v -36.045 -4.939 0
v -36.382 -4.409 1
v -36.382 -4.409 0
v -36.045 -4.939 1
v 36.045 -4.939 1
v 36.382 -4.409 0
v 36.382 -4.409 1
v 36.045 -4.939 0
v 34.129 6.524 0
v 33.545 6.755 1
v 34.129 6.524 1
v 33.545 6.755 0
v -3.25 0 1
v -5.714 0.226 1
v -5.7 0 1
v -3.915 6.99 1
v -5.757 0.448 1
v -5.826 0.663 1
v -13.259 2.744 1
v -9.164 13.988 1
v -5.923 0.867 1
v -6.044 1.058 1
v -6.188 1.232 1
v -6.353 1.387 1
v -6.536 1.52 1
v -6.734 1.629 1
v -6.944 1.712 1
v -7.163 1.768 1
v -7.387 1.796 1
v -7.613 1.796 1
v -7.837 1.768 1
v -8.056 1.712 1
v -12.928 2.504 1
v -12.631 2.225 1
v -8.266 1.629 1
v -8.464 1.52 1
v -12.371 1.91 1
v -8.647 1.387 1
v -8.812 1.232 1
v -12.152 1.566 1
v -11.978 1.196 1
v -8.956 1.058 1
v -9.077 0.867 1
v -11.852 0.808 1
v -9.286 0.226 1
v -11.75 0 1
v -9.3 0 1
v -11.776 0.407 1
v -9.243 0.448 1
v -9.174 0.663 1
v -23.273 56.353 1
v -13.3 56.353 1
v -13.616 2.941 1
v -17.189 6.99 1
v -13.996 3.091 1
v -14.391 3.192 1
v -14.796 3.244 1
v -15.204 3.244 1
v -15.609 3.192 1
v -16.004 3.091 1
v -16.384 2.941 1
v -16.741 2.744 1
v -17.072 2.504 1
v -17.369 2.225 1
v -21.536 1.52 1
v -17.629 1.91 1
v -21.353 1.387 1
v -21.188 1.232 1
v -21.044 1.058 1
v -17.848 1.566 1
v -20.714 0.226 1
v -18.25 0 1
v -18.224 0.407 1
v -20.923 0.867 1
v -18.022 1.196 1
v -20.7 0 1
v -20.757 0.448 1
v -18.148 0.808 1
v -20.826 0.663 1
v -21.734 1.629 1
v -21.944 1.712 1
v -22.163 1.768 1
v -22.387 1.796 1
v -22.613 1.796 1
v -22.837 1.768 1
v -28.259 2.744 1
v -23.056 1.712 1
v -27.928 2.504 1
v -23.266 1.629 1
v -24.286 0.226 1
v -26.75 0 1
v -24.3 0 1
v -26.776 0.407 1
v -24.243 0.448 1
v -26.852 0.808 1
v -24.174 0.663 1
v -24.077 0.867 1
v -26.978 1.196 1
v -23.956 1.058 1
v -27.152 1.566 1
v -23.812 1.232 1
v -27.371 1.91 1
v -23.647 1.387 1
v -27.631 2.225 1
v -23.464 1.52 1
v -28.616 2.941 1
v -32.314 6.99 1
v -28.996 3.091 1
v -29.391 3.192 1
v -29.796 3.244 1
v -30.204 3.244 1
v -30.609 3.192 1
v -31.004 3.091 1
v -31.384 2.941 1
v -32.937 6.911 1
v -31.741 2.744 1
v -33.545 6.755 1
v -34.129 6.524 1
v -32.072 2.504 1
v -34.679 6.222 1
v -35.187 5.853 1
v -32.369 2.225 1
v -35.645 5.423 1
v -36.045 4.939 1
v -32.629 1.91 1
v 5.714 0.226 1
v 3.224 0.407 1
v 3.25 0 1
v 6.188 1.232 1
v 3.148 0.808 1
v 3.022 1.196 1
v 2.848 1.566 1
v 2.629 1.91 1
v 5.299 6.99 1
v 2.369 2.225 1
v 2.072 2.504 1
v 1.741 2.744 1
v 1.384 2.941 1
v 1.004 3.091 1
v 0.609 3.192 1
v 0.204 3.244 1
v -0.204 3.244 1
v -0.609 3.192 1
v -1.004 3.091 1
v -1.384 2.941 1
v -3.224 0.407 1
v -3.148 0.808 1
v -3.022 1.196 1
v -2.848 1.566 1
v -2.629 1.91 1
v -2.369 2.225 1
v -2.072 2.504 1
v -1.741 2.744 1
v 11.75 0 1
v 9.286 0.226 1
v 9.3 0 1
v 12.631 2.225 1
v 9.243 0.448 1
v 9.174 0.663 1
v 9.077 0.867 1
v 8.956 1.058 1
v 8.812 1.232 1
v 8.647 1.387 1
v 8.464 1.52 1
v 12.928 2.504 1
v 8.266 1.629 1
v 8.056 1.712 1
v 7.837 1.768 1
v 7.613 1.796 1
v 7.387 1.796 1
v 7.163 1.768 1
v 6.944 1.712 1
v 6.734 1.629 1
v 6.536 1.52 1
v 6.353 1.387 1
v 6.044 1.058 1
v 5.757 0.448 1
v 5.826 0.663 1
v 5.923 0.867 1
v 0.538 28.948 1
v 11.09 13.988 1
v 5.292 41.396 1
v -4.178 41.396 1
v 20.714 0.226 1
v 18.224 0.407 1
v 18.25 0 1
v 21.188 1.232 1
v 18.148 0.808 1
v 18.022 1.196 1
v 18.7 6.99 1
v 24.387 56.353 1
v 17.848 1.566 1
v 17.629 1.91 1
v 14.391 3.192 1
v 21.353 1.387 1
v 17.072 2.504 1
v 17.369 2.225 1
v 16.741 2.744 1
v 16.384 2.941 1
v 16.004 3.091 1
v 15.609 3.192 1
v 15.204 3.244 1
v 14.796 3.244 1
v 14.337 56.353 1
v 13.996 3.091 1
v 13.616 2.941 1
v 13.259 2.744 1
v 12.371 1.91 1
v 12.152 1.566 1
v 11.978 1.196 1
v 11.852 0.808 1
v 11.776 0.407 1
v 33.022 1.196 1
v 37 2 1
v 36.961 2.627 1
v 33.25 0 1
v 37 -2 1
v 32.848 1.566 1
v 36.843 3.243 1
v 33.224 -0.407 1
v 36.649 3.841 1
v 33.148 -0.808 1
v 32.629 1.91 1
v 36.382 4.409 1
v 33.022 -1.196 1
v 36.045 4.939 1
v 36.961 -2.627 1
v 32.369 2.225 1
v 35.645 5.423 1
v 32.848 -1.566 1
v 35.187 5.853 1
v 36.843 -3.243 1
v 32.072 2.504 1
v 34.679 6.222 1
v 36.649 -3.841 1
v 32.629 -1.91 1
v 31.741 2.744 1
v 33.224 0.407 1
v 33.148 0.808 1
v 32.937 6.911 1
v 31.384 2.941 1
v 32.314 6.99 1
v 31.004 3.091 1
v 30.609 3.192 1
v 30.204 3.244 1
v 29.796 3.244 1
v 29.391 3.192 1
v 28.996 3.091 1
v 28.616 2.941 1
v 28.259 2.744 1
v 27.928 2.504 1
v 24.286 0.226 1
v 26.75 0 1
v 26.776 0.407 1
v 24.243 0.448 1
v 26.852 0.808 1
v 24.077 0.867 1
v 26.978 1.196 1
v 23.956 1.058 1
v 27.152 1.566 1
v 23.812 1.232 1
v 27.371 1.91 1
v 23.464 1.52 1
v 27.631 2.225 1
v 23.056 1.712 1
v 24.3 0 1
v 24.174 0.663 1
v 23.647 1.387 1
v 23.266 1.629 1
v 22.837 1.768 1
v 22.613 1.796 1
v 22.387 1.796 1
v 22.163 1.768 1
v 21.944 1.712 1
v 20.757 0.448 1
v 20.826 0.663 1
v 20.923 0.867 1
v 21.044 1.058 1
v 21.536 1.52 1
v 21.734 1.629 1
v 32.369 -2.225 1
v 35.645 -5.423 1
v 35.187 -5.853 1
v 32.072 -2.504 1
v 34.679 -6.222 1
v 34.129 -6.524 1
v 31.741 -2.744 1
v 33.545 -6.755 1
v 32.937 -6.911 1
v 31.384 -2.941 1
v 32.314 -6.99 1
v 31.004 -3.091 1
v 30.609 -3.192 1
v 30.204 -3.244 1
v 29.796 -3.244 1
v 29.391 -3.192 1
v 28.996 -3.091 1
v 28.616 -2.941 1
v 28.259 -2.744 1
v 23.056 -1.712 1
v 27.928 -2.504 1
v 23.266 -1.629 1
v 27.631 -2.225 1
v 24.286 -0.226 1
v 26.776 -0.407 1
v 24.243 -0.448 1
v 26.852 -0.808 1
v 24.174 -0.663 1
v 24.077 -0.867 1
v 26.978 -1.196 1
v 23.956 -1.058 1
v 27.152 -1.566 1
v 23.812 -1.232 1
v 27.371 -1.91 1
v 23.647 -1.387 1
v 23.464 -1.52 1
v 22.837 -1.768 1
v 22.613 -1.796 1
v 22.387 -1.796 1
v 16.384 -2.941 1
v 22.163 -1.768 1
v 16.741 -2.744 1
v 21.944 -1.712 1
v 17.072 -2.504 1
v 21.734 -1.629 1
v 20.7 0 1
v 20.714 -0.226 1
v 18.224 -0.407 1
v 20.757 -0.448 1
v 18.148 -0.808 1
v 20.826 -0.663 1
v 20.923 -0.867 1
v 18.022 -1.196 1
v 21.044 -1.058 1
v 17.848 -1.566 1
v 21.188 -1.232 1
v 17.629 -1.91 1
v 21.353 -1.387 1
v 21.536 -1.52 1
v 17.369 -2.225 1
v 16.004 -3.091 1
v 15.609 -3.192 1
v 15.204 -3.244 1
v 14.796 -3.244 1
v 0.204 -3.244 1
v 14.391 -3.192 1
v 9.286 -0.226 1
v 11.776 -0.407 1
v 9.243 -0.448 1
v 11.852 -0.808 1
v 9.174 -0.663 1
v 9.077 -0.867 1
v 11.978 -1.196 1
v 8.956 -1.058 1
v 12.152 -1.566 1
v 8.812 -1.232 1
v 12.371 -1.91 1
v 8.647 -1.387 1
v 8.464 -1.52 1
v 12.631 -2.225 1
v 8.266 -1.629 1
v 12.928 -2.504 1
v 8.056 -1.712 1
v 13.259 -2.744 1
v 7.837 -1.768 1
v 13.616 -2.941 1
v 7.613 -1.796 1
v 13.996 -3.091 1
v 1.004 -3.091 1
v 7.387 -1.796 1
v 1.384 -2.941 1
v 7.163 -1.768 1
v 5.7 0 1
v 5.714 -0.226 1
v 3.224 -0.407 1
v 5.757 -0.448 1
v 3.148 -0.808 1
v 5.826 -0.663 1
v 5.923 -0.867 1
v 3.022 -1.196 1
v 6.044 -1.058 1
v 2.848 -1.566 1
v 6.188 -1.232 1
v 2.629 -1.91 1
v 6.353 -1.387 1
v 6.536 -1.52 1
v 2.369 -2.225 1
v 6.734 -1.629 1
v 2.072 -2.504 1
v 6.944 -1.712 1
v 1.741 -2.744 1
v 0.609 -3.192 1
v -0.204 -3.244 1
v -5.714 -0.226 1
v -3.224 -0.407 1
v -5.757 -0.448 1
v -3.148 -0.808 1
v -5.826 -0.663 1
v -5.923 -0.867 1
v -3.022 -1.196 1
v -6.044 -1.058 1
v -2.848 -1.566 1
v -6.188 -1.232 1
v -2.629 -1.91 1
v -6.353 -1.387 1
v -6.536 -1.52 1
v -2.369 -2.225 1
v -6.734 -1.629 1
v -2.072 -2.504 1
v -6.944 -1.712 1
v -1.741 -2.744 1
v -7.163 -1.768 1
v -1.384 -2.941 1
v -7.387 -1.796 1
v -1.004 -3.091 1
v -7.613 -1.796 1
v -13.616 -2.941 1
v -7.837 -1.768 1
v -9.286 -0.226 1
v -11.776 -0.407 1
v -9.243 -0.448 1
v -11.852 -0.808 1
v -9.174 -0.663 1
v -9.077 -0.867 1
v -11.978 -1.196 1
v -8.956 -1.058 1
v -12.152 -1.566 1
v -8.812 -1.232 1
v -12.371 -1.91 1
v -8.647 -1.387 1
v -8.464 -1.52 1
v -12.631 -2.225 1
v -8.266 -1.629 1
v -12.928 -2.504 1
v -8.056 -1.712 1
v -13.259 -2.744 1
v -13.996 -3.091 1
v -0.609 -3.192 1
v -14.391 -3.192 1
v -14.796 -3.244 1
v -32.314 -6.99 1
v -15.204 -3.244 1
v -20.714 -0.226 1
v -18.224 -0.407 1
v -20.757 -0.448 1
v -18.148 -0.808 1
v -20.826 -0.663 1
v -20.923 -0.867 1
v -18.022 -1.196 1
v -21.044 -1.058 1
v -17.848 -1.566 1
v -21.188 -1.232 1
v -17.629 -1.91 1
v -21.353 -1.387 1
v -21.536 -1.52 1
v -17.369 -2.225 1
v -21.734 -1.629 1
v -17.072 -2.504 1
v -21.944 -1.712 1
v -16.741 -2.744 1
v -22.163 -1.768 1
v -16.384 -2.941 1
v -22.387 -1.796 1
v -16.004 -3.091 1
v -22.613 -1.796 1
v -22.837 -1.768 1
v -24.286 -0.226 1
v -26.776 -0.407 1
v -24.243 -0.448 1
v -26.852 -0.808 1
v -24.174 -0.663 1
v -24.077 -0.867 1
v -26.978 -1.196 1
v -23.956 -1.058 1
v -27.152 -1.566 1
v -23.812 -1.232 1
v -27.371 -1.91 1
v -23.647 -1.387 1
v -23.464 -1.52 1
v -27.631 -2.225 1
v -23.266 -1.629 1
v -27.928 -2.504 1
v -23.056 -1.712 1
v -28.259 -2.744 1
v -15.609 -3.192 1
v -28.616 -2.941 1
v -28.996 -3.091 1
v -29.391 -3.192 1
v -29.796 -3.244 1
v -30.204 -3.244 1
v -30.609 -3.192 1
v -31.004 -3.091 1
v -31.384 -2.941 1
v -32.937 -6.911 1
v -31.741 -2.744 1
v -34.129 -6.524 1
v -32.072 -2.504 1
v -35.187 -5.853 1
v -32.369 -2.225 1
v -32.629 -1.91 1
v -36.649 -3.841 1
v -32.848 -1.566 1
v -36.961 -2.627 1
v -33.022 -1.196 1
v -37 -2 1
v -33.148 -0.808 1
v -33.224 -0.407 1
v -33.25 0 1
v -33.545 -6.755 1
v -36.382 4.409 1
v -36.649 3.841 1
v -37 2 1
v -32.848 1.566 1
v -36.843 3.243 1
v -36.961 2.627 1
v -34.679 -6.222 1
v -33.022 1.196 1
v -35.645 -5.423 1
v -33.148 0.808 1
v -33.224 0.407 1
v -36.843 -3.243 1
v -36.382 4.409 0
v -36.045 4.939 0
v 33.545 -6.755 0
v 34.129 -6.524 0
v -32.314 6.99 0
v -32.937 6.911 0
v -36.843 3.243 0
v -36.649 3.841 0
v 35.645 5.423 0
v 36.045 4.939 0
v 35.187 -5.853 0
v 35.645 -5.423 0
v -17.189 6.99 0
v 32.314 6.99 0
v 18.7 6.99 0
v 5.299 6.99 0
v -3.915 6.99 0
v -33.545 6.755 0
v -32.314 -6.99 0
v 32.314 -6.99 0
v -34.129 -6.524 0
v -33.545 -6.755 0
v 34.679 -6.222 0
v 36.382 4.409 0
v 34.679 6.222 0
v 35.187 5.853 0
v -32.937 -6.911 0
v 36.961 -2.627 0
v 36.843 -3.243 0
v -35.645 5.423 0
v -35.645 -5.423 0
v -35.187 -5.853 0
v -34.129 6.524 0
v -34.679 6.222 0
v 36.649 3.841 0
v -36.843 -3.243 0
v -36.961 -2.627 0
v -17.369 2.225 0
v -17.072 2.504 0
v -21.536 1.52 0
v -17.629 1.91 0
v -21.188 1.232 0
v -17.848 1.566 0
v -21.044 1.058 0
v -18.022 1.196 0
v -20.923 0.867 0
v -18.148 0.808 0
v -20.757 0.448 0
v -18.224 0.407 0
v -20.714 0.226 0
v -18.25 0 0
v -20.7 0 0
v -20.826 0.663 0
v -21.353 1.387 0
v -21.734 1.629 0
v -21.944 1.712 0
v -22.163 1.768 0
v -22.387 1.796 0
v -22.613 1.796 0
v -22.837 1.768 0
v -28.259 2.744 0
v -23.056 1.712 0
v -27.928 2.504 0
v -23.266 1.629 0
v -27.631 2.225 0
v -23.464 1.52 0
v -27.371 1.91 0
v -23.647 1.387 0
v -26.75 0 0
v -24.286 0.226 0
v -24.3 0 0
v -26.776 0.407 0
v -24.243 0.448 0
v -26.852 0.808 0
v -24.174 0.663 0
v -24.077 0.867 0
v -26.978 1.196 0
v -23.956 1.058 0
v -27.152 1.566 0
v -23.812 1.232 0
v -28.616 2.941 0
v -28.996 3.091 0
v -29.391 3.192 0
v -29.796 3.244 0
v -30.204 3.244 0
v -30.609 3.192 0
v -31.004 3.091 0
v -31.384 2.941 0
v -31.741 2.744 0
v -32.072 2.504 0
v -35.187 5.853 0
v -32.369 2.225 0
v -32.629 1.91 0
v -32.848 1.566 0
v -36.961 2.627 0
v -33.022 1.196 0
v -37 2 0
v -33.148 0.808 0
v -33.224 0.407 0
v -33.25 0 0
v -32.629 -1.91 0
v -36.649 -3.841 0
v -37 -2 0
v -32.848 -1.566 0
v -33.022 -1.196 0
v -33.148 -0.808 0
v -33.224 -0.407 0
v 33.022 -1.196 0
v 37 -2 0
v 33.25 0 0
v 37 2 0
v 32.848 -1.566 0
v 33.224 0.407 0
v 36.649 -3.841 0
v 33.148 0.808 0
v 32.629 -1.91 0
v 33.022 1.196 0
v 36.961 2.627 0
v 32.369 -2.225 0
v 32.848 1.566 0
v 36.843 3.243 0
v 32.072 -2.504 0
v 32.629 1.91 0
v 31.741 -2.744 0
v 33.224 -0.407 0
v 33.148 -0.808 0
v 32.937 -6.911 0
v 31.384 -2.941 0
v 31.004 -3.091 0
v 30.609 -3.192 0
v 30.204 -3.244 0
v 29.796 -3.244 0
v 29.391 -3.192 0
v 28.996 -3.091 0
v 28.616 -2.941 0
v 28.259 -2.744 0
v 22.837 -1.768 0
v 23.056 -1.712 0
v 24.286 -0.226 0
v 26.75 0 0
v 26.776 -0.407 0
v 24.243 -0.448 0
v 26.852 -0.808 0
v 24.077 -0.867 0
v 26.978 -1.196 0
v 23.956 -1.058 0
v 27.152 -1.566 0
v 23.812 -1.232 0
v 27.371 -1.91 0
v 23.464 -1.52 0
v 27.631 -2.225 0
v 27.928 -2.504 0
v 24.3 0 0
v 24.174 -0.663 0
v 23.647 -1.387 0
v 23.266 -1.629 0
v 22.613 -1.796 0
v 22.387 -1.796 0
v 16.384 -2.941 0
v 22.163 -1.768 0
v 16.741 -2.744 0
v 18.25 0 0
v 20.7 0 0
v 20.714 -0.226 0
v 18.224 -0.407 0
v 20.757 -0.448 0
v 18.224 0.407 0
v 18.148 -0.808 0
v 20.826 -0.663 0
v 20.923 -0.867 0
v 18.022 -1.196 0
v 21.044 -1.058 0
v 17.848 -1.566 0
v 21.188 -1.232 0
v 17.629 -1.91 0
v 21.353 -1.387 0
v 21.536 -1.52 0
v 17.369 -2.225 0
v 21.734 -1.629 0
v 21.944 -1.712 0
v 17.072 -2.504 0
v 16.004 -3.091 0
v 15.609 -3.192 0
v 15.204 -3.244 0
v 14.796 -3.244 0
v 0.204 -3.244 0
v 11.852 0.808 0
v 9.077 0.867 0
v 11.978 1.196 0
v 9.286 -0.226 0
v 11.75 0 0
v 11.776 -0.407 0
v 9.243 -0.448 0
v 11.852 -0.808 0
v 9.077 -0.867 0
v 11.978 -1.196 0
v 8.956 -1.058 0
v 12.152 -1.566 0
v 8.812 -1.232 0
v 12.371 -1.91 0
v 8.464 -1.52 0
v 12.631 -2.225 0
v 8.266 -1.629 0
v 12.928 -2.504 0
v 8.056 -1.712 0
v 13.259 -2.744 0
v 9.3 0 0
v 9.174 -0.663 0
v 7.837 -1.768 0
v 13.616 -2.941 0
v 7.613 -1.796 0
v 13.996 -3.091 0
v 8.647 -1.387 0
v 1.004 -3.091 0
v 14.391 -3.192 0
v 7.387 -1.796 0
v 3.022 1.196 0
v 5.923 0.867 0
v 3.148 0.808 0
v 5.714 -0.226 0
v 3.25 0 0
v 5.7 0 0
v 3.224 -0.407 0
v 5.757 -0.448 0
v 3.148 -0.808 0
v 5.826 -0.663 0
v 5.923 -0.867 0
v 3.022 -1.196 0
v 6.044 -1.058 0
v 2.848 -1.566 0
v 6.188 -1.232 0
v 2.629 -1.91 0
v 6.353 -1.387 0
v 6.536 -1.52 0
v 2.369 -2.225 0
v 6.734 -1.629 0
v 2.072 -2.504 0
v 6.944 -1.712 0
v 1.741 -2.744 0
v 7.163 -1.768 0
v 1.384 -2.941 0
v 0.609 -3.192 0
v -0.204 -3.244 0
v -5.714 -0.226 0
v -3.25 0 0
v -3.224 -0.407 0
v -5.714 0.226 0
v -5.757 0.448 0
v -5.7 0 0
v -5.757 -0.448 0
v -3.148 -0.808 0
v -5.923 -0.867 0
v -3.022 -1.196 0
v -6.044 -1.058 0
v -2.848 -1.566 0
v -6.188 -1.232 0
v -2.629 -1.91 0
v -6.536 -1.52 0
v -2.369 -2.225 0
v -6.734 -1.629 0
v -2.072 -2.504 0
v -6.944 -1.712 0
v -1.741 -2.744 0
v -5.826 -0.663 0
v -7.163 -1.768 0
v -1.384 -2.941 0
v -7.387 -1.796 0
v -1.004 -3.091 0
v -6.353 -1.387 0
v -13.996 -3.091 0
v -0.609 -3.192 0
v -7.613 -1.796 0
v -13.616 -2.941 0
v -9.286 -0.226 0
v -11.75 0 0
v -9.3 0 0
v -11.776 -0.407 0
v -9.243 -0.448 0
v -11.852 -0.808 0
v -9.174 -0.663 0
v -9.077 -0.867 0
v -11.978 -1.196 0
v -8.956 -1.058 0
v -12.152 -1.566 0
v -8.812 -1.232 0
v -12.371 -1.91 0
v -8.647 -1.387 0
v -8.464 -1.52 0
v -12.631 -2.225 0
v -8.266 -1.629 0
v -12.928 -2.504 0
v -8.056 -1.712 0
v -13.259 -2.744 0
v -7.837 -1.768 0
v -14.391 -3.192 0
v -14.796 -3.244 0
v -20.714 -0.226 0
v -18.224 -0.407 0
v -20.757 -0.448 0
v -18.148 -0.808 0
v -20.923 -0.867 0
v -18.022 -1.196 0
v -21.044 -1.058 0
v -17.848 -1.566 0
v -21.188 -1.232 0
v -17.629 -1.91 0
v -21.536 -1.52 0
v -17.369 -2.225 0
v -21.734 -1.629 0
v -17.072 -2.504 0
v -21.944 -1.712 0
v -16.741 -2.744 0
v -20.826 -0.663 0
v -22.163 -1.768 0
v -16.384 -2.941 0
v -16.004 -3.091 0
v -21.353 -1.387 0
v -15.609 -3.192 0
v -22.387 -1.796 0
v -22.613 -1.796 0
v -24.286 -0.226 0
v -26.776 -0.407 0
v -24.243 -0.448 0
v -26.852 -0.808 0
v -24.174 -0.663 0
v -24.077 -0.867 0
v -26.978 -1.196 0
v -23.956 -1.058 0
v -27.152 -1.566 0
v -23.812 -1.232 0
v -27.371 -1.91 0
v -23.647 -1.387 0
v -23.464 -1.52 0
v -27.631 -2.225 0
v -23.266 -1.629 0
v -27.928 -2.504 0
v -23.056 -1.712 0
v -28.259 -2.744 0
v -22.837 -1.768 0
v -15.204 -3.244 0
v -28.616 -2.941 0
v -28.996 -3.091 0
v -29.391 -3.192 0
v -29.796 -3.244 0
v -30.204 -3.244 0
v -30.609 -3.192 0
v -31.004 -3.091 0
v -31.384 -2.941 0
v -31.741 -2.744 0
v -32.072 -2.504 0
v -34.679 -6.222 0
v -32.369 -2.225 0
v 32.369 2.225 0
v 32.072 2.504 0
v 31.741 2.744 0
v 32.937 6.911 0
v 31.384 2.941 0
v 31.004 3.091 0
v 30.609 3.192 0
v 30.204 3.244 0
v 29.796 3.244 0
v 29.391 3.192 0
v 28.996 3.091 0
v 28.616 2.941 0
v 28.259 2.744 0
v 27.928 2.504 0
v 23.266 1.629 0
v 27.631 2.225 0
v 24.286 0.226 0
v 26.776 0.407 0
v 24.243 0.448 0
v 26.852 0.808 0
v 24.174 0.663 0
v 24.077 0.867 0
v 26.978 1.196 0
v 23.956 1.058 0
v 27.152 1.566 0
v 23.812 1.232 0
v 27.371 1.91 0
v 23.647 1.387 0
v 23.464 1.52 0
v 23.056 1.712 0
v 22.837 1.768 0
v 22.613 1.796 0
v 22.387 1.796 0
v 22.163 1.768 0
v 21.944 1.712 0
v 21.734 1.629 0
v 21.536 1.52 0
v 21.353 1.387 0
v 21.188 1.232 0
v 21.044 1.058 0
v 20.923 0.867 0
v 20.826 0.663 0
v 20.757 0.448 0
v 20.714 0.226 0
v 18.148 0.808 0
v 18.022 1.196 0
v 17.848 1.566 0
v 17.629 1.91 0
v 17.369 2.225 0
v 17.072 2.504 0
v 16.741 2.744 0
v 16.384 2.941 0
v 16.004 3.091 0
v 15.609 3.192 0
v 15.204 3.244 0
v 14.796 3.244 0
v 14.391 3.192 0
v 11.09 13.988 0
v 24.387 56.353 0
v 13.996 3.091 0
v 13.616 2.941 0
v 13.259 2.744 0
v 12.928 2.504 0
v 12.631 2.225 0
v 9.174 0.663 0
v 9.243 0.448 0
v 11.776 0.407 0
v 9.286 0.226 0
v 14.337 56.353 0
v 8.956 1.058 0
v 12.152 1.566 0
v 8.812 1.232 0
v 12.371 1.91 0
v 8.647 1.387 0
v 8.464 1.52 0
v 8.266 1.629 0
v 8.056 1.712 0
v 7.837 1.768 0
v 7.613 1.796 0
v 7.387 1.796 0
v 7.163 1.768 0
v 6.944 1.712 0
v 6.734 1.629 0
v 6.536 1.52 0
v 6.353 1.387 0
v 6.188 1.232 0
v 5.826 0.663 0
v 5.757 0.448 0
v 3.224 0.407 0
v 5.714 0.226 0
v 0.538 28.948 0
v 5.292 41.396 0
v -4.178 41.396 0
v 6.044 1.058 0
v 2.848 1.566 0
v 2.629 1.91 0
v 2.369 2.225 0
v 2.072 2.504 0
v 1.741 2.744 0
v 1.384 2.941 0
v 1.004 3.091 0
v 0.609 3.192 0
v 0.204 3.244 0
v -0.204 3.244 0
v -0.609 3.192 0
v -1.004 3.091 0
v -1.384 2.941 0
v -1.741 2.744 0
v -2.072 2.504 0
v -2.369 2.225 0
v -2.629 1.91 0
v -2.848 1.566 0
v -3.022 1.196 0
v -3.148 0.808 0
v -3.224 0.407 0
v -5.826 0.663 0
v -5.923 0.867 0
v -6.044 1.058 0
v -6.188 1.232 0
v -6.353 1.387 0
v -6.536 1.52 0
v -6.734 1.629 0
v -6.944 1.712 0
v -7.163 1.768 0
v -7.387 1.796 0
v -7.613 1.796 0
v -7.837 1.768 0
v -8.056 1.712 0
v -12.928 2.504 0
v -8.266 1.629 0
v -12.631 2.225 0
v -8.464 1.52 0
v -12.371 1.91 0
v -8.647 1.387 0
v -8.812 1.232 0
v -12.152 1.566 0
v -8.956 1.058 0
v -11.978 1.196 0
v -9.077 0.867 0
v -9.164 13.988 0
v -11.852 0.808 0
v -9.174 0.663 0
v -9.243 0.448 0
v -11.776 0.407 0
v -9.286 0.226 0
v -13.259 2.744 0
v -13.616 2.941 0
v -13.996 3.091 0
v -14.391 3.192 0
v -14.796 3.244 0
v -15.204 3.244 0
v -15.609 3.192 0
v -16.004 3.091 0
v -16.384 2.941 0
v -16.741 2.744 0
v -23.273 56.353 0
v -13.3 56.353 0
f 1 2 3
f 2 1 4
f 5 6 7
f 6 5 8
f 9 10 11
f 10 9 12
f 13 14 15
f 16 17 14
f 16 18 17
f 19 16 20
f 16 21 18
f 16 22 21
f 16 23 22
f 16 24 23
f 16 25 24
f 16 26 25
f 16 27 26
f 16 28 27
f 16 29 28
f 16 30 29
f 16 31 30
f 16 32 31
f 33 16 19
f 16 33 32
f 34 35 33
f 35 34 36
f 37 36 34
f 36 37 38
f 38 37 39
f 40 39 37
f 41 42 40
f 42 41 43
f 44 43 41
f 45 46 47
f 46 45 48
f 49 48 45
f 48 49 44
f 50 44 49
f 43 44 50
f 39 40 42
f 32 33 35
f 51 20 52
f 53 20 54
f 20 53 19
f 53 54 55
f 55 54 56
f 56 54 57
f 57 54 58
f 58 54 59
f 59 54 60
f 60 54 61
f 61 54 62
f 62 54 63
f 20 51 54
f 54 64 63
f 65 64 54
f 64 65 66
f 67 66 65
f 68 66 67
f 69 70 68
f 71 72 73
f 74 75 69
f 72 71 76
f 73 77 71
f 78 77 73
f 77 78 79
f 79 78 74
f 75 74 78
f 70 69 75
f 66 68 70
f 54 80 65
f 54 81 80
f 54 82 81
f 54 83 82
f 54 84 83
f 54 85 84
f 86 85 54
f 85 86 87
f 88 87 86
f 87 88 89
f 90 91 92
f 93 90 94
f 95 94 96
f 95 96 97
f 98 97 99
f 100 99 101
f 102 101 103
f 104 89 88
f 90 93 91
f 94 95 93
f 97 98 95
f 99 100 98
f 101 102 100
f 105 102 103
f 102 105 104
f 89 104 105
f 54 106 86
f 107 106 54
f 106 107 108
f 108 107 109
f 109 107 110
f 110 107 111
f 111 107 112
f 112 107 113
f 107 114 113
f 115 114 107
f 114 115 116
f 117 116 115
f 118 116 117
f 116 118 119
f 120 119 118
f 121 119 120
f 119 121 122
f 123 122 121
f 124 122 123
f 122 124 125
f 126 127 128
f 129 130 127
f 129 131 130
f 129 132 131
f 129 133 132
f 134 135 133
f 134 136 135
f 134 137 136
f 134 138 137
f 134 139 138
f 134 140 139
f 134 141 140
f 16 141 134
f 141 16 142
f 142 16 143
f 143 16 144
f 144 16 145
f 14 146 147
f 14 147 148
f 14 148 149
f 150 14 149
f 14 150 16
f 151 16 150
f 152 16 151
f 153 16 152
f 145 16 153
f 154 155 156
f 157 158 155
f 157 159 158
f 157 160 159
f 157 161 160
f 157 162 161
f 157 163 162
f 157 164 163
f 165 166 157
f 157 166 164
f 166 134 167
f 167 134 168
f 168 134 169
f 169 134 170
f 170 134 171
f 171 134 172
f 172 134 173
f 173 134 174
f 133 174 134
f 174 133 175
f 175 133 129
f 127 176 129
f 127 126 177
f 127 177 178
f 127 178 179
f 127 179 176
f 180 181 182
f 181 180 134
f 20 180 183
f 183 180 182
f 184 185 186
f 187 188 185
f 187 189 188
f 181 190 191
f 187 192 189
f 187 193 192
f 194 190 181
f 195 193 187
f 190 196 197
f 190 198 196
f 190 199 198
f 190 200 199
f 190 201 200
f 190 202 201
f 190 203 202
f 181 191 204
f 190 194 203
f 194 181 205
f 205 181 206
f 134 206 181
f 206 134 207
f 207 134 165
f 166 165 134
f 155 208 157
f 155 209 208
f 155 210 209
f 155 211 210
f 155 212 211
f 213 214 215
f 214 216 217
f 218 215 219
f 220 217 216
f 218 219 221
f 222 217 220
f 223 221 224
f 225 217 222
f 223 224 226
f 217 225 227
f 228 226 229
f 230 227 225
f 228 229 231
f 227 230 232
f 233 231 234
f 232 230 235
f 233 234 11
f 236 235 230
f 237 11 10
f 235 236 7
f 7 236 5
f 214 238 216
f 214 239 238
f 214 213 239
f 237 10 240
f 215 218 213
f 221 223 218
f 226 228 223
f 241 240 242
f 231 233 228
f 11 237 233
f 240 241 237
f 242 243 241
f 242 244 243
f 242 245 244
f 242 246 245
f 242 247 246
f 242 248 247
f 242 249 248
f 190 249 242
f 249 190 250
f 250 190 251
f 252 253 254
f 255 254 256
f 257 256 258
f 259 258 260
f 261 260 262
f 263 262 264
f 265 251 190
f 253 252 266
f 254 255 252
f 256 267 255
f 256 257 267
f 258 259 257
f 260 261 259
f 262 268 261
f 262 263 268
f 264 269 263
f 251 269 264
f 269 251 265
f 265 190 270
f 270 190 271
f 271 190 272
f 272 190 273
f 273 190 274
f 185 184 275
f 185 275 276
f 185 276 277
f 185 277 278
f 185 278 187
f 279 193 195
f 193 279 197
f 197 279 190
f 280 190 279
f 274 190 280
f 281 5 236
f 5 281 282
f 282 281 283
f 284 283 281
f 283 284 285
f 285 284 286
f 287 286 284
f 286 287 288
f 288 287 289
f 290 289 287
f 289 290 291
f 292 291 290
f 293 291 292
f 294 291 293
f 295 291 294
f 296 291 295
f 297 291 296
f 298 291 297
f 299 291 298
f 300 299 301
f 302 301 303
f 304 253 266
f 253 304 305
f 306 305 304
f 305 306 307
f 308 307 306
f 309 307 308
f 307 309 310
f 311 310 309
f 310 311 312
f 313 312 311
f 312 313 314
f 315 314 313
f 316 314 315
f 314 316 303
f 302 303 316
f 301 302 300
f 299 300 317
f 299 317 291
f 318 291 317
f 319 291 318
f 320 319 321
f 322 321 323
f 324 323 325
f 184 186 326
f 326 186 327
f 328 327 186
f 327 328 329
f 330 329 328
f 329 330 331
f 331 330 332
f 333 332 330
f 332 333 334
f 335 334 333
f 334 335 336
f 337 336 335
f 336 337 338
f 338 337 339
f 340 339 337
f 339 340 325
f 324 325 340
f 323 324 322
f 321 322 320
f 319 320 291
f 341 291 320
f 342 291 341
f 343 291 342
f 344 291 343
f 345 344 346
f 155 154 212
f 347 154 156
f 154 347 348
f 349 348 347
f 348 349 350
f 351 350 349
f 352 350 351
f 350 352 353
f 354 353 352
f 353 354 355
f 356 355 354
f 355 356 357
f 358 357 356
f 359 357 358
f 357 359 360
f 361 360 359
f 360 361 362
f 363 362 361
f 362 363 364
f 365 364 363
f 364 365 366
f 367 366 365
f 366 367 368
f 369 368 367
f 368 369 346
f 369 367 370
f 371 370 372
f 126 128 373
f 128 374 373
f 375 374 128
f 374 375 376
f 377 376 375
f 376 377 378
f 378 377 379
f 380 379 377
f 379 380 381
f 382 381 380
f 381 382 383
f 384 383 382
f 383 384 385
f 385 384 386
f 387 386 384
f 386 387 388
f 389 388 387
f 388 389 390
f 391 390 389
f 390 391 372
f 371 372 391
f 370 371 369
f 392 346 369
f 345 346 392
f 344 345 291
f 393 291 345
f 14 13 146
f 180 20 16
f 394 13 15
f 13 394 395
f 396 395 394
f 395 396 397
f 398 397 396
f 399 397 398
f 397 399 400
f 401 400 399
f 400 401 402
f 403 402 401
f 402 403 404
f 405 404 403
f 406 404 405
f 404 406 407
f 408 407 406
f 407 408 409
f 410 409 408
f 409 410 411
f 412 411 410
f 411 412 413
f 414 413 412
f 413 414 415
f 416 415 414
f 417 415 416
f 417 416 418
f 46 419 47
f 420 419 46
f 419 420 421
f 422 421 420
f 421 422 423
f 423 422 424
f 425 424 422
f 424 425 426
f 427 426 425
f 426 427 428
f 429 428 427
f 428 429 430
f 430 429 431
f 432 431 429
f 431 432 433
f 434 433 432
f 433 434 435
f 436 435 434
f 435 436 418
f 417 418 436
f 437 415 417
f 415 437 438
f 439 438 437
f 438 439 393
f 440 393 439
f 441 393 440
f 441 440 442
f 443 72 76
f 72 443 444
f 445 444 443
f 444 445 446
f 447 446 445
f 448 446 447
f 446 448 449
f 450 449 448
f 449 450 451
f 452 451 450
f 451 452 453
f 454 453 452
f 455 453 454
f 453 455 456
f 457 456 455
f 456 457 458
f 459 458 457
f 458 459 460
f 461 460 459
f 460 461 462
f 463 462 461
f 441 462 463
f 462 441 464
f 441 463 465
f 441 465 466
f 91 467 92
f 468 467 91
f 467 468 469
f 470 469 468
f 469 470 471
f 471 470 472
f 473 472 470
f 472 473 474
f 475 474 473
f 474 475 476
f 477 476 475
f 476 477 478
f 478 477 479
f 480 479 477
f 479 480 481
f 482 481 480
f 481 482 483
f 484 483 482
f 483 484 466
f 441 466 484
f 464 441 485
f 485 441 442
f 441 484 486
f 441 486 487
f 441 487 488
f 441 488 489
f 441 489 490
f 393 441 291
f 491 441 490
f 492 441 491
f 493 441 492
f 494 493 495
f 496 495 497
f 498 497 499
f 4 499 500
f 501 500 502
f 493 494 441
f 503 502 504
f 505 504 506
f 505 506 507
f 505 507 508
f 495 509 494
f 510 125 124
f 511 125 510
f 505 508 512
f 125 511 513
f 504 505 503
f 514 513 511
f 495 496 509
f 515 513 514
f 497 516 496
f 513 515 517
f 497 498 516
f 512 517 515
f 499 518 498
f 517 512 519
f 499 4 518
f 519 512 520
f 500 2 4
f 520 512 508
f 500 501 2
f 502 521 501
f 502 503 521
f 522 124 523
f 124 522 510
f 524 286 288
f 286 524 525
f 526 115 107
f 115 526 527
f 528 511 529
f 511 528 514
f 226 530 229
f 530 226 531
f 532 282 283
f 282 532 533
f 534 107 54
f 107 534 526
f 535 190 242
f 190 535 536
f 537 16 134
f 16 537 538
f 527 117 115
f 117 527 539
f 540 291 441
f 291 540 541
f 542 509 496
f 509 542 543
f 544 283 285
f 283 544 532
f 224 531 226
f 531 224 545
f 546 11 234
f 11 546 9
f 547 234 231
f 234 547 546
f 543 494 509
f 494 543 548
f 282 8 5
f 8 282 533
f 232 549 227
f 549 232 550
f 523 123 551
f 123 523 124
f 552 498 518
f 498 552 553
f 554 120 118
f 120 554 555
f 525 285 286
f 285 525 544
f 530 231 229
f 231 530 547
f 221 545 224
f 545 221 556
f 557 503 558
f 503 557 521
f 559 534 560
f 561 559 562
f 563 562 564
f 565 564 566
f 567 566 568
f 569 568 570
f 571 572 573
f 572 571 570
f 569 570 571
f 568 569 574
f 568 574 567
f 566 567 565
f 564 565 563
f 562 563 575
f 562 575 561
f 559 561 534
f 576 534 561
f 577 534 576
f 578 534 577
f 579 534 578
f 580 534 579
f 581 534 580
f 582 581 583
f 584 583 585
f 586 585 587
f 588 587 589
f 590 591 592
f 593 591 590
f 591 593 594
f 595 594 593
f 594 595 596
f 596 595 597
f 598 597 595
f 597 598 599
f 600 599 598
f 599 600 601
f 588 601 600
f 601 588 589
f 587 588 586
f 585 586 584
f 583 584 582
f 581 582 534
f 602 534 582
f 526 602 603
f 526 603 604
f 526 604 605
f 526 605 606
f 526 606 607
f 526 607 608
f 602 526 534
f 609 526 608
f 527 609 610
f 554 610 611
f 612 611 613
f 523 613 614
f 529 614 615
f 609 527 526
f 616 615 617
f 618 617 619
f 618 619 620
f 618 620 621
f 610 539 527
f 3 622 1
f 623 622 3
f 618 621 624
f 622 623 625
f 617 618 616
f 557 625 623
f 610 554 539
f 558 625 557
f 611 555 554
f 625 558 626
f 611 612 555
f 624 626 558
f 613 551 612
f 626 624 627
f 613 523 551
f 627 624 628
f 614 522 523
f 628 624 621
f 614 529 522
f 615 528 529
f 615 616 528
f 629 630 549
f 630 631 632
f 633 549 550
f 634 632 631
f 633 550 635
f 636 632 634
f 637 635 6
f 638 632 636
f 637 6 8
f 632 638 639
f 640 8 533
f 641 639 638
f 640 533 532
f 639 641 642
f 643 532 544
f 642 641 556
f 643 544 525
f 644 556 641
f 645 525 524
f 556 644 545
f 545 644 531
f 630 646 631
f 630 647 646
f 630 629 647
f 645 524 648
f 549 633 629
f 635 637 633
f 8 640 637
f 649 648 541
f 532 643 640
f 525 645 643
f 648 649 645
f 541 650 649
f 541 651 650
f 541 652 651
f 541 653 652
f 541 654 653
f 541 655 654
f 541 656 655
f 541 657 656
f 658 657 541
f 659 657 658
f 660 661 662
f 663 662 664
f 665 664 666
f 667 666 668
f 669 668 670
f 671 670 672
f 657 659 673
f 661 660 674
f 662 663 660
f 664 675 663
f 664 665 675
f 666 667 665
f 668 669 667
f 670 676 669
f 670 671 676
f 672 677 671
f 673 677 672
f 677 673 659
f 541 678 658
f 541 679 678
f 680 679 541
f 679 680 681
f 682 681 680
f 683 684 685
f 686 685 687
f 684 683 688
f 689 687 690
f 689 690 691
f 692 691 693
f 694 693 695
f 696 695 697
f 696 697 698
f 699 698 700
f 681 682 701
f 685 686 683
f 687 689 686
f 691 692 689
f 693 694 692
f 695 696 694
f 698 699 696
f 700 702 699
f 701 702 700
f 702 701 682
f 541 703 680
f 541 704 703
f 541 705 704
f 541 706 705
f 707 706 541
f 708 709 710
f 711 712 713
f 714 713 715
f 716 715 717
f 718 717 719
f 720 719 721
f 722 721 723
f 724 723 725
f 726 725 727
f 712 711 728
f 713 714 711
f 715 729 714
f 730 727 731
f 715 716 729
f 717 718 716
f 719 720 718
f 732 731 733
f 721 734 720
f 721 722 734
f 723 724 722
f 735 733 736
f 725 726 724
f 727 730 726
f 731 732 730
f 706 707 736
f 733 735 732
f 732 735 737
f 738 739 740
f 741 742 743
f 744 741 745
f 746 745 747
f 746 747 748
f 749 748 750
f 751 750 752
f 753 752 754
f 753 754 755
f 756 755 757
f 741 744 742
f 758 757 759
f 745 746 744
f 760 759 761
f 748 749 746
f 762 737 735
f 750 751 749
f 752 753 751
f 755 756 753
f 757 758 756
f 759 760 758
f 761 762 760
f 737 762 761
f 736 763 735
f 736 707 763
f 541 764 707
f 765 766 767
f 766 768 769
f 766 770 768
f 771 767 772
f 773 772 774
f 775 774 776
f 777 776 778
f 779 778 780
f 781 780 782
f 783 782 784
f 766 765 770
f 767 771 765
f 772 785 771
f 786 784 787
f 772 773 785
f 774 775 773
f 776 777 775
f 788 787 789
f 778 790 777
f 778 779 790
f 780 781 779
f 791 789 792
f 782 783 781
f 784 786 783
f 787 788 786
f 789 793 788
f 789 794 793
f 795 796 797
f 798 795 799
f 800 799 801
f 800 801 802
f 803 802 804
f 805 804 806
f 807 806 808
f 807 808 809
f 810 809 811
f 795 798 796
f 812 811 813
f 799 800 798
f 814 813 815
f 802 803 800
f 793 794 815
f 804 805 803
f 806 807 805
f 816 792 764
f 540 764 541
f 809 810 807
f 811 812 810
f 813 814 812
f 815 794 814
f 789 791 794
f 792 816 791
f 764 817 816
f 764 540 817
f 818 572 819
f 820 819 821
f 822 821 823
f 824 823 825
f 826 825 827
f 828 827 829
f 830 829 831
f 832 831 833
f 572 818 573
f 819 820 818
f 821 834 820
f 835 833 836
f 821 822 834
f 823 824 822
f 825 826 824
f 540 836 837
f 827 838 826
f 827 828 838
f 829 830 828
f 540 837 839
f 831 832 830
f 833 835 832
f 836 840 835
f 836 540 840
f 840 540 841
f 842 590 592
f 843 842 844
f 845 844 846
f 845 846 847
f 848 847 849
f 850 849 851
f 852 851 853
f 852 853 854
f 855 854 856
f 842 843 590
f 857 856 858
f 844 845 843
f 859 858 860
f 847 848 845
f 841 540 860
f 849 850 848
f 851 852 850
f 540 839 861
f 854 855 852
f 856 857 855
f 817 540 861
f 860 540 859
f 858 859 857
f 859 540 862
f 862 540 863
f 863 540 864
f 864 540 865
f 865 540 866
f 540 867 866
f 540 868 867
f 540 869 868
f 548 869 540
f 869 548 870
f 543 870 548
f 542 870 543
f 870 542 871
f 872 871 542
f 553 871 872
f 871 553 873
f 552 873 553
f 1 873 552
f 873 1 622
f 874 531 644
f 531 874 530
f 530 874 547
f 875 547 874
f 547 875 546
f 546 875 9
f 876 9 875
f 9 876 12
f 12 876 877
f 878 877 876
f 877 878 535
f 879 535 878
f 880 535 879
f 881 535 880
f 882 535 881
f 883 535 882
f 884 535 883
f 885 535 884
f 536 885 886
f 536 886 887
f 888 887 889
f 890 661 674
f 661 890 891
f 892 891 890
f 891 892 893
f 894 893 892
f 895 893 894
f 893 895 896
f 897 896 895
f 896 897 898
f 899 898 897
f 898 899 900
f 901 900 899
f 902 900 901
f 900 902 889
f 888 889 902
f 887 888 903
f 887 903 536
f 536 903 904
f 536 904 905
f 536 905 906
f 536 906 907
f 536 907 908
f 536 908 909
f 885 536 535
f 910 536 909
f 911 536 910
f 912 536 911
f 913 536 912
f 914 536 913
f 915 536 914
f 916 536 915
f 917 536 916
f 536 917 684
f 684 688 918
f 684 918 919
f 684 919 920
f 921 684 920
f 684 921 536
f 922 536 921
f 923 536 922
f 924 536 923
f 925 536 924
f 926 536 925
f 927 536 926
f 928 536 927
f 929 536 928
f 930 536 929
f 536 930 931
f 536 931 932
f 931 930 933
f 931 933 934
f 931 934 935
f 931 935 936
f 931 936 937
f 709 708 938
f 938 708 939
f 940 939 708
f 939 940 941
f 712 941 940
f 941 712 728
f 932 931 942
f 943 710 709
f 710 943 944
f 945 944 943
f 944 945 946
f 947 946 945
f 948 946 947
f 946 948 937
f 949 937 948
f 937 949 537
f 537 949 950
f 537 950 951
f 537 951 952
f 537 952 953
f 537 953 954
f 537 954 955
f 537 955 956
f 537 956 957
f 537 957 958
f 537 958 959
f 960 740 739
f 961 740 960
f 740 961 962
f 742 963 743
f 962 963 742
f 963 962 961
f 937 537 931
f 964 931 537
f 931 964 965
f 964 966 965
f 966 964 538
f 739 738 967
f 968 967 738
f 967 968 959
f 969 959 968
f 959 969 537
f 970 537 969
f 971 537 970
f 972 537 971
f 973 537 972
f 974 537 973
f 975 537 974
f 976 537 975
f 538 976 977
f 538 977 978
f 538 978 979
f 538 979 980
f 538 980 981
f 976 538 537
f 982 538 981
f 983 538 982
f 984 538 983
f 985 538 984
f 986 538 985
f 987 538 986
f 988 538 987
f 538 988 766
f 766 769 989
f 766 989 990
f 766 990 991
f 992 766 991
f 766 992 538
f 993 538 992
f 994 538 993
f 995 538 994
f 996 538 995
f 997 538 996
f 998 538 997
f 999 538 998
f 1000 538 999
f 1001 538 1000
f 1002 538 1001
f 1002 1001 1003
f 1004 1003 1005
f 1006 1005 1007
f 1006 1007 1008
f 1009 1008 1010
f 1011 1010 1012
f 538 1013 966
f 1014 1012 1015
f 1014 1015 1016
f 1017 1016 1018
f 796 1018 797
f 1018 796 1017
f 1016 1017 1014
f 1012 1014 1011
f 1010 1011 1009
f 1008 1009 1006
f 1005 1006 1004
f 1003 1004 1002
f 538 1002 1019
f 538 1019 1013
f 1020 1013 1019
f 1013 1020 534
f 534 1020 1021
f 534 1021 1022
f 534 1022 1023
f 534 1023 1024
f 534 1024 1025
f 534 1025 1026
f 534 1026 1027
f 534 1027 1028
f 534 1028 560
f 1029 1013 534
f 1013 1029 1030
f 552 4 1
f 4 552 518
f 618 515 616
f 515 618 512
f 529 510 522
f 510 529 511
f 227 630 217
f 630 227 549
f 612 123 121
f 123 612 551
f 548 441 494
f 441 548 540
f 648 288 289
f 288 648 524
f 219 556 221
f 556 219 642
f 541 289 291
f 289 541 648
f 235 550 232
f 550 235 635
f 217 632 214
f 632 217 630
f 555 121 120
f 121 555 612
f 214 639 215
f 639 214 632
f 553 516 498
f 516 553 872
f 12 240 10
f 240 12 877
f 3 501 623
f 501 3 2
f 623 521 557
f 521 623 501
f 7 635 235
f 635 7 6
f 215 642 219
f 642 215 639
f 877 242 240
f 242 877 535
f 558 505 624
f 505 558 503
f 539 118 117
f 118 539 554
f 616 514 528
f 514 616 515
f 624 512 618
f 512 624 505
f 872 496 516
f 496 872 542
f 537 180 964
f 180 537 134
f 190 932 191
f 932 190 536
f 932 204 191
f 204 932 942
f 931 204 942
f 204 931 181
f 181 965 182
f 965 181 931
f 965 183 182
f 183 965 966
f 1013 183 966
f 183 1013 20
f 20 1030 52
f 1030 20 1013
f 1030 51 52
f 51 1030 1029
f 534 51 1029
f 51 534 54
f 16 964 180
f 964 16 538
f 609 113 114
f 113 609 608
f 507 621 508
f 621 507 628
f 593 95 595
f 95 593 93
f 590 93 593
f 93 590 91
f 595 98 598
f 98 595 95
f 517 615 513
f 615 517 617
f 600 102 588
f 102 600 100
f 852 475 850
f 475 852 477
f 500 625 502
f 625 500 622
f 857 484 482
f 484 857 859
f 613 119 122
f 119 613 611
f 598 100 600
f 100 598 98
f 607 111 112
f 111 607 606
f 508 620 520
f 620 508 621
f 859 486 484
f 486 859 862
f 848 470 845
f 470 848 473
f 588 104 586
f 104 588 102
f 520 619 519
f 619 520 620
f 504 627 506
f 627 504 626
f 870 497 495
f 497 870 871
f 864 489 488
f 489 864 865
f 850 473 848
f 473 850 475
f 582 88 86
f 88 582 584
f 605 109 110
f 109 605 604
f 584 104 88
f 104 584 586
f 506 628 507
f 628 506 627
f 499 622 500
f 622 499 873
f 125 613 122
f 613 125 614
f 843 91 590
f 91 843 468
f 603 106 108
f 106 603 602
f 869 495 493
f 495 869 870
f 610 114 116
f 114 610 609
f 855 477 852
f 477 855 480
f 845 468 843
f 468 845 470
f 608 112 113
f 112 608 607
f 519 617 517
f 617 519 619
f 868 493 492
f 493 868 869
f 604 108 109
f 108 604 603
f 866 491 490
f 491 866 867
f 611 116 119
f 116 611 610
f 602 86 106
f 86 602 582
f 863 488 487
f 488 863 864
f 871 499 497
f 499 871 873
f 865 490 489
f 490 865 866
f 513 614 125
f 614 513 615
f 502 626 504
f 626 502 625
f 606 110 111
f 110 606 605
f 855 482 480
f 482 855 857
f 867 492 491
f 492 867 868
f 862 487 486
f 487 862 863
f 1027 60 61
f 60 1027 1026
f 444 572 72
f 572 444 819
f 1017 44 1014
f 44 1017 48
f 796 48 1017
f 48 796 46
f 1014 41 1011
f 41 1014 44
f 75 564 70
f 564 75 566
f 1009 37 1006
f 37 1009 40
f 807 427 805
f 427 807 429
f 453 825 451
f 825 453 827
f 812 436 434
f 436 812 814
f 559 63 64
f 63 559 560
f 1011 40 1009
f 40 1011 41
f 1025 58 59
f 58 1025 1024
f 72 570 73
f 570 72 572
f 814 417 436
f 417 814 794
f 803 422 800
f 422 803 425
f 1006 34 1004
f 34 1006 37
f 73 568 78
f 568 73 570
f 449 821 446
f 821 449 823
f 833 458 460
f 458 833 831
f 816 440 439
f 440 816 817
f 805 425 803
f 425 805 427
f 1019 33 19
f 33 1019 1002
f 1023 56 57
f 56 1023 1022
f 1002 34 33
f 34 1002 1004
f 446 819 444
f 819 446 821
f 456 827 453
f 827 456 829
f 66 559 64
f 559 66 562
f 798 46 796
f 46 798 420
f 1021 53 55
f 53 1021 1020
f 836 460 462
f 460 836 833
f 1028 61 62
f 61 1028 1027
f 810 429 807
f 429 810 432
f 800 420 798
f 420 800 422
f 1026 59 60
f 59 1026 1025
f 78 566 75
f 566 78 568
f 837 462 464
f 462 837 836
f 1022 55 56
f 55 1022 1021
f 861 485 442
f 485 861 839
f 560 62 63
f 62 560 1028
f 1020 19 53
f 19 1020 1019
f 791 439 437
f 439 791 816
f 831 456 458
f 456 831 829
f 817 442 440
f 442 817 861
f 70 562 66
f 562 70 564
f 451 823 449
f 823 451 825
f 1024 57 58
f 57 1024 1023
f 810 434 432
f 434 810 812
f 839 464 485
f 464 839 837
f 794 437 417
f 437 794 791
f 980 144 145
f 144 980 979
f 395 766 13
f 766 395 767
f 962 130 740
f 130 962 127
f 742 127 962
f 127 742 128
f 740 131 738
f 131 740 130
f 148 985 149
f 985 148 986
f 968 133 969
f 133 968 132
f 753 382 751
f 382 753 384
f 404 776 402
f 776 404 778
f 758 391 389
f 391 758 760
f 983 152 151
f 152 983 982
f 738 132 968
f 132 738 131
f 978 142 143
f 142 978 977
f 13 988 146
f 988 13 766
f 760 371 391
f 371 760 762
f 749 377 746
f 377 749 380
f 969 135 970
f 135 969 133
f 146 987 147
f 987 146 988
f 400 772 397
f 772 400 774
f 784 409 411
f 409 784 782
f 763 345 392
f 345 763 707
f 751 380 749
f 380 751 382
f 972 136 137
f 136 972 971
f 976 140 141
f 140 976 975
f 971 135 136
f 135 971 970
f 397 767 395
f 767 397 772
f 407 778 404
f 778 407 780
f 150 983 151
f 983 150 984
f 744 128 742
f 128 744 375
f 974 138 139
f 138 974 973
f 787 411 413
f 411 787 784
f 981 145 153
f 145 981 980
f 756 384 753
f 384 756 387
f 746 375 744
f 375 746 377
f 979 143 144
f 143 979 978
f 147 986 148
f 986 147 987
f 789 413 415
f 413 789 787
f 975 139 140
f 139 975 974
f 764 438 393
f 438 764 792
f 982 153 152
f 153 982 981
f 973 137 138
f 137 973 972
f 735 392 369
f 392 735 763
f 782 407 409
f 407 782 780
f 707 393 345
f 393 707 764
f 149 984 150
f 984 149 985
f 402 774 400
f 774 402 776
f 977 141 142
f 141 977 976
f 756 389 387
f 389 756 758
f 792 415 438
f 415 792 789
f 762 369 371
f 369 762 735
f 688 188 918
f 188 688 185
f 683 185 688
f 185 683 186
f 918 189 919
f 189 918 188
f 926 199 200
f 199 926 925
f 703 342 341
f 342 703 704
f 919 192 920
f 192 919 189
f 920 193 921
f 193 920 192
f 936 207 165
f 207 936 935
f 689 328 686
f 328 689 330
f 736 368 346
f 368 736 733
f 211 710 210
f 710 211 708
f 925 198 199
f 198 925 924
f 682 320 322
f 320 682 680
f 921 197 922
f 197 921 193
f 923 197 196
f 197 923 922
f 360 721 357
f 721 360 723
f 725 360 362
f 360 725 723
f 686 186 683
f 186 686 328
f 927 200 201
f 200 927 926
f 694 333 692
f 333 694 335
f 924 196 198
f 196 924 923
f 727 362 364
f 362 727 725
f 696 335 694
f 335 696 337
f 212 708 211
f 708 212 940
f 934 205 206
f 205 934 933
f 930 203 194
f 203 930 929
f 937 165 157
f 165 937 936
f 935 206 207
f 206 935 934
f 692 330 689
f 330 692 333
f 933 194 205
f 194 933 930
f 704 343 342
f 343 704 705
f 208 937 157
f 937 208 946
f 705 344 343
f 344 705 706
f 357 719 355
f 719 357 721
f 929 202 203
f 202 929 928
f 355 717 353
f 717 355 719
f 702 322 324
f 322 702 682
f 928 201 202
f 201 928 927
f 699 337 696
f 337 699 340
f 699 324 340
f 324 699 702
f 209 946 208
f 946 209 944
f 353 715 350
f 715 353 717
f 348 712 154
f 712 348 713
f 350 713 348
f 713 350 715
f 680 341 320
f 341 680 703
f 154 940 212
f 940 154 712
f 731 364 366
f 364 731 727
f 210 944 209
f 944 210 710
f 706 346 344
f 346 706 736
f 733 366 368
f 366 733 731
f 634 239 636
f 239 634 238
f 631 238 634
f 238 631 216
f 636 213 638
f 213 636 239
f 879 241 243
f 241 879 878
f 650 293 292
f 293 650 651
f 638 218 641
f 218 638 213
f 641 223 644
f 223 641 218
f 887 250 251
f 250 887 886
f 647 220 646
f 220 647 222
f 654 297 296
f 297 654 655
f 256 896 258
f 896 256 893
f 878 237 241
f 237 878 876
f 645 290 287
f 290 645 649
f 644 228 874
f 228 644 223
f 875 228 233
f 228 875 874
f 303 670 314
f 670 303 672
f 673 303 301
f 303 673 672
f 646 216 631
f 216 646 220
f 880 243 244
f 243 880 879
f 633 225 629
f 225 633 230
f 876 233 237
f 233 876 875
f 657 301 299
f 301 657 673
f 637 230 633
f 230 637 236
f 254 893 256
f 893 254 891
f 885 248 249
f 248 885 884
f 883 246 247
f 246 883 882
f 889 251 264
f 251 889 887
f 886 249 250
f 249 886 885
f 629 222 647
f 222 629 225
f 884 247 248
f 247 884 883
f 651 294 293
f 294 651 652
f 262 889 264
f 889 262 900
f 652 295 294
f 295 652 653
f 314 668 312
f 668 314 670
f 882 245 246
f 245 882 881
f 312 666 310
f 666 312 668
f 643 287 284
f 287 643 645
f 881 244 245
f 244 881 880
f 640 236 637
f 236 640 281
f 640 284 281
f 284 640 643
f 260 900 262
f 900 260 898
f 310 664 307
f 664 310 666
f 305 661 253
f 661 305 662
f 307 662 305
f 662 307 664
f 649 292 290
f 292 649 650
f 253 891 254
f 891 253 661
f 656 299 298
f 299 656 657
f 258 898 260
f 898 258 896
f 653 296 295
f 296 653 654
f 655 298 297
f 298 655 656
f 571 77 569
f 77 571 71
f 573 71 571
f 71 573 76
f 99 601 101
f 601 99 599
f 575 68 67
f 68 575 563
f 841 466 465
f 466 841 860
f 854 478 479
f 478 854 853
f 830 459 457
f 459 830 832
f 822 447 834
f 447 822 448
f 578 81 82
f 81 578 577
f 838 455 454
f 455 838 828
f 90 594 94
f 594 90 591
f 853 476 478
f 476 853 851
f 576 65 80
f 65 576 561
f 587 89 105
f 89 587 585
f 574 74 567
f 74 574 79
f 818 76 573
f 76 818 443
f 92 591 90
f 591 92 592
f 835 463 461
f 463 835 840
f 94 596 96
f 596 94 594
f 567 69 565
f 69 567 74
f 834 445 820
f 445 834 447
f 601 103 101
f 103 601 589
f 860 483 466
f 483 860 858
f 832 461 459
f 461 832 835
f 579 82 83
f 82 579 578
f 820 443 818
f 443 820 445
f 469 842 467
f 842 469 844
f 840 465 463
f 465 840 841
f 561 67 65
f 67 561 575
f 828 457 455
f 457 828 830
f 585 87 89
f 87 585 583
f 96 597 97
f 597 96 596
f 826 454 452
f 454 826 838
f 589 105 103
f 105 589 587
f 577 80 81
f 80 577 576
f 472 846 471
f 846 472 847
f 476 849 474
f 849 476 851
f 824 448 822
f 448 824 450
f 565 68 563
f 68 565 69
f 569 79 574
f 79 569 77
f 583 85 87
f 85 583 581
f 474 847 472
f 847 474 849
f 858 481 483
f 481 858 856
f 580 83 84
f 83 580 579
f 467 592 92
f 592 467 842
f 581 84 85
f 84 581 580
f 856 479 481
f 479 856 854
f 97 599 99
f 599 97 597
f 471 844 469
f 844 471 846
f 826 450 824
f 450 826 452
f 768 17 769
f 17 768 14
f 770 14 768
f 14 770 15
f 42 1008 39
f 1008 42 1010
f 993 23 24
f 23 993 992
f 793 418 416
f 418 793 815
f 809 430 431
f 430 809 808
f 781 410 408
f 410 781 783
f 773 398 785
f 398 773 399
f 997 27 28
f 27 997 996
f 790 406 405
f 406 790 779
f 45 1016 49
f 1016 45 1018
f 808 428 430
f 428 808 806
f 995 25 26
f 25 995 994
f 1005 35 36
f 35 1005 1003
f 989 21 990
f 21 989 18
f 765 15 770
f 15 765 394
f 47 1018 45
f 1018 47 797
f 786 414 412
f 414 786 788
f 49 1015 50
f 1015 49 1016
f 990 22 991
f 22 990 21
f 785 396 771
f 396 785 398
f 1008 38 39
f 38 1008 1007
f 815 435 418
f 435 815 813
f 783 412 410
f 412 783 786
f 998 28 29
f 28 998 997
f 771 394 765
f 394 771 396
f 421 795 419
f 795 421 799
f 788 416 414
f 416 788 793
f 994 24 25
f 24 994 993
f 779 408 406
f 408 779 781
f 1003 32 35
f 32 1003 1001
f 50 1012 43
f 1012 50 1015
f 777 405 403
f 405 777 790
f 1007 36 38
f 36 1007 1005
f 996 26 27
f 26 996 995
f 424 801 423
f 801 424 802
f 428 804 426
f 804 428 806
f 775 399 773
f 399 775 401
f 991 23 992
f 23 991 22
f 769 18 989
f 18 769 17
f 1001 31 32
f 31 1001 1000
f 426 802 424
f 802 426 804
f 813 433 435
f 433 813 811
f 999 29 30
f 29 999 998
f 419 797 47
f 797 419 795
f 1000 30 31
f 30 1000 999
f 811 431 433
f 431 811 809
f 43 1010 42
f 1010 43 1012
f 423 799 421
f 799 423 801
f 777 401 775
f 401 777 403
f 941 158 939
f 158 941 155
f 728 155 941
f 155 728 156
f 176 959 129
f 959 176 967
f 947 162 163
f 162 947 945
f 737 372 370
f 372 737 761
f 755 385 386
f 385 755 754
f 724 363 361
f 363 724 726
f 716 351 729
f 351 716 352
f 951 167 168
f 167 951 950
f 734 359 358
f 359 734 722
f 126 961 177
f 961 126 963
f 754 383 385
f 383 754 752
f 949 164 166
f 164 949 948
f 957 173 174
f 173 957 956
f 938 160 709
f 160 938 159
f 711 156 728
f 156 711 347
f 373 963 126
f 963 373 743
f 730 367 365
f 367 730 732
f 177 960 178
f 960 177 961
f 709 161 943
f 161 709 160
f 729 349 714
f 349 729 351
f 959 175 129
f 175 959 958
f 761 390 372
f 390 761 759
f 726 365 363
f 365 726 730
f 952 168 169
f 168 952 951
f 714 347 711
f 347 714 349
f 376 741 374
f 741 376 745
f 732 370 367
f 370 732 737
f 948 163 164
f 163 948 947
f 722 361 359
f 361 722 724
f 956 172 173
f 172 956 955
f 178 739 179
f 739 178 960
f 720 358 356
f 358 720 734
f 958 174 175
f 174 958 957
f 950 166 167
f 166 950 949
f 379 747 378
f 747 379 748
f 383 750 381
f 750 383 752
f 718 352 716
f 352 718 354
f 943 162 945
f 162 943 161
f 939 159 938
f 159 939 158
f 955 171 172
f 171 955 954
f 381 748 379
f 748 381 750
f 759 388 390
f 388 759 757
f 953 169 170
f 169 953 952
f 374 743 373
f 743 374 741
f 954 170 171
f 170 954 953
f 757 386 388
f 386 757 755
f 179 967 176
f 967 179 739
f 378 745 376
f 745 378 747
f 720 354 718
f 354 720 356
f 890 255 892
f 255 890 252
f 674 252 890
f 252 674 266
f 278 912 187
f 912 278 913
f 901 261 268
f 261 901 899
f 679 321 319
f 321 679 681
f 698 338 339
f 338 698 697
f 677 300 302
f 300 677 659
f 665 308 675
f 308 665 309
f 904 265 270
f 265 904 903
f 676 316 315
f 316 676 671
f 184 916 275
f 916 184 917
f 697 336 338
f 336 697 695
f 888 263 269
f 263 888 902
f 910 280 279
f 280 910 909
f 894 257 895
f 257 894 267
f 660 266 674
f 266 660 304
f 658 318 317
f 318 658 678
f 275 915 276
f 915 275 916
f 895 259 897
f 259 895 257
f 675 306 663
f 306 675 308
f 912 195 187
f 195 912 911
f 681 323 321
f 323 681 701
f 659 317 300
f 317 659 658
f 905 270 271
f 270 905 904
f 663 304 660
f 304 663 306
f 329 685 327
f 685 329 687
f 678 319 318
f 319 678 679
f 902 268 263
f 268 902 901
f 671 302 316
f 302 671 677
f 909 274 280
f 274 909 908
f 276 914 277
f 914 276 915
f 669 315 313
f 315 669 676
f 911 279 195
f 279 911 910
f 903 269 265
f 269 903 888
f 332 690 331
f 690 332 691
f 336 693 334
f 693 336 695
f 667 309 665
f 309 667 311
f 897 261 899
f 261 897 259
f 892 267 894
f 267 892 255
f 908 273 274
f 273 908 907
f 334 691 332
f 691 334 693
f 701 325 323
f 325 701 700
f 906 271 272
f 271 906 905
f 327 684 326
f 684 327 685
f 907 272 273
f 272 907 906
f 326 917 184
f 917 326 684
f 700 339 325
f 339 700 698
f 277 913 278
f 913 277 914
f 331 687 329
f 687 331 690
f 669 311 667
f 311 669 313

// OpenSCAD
$fn = 50;


difference() {
	union() {
		hull() {
			translate(v = [-32.0000000000, 2.0000000000, 0]) {
				cylinder(h = 1, r = 5);
			}
			translate(v = [32.0000000000, 2.0000000000, 0]) {
				cylinder(h = 1, r = 5);
			}
			translate(v = [-32.0000000000, -2.0000000000, 0]) {
				cylinder(h = 1, r = 5);
			}
			translate(v = [32.0000000000, -2.0000000000, 0]) {
				cylinder(h = 1, r = 5);
			}
		}
		translate(v = [0, 55, 0]) {
			linear_extrude(height = 1) {
				text(font = "DejaVu Sans Mono:style=Bold", halign = "center", size = 57.0000000000, text = "W", valign = "top");
			}
		}
	}
	union() {
		translate(v = [-30.0000000000, 0.0000000000, 0]) {
			translate(v = [0, 0, -100]) {
				cylinder(h = 200, r = 3.2500000000);
			}
		}
		translate(v = [-15.0000000000, 0.0000000000, 0]) {
			translate(v = [0, 0, -100]) {
				cylinder(h = 200, r = 3.2500000000);
			}
		}
		translate(v = [0, 0, -100]) {
			cylinder(h = 200, r = 3.2500000000);
		}
		translate(v = [15.0000000000, 0.0000000000, 0]) {
			translate(v = [0, 0, -100]) {
				cylinder(h = 200, r = 3.2500000000);
			}
		}
		translate(v = [30.0000000000, 0.0000000000, 0]) {
			translate(v = [0, 0, -100]) {
				cylinder(h = 200, r = 3.2500000000);
			}
		}
		translate(v = [-30.0000000000, 0.0000000000, 0]) {
			translate(v = [0, 0, -100]) {
				cylinder(h = 200, r = 1.8000000000);
			}
		}
		translate(v = [-22.5000000000, 0.0000000000, 0]) {
			translate(v = [0, 0, -100]) {
				cylinder(h = 200, r = 1.8000000000);
			}
		}
		translate(v = [-15.0000000000, 0.0000000000, 0]) {
			translate(v = [0, 0, -100]) {
				cylinder(h = 200, r = 1.8000000000);
			}
		}
		translate(v = [-7.5000000000, 0.0000000000, 0]) {
			translate(v = [0, 0, -100]) {
				cylinder(h = 200, r = 1.8000000000);
			}
		}
		translate(v = [0, 0, -100]) {
			cylinder(h = 200, r = 1.8000000000);
		}
		translate(v = [7.5000000000, 0.0000000000, 0]) {
			translate(v = [0, 0, -100]) {
				cylinder(h = 200, r = 1.8000000000);
			}
		}
		translate(v = [15.0000000000, 0.0000000000, 0]) {
			translate(v = [0, 0, -100]) {
				cylinder(h = 200, r = 1.8000000000);
			}
		}
		translate(v = [22.5000000000, 0.0000000000, 0]) {
			translate(v = [0, 0, -100]) {
				cylinder(h = 200, r = 1.8000000000);
			}
		}
		translate(v = [30.0000000000, 0.0000000000, 0]) {
			translate(v = [0, 0, -100]) {
				cylinder(h = 200, r = 1.8000000000);
			}
		}
	}
}
